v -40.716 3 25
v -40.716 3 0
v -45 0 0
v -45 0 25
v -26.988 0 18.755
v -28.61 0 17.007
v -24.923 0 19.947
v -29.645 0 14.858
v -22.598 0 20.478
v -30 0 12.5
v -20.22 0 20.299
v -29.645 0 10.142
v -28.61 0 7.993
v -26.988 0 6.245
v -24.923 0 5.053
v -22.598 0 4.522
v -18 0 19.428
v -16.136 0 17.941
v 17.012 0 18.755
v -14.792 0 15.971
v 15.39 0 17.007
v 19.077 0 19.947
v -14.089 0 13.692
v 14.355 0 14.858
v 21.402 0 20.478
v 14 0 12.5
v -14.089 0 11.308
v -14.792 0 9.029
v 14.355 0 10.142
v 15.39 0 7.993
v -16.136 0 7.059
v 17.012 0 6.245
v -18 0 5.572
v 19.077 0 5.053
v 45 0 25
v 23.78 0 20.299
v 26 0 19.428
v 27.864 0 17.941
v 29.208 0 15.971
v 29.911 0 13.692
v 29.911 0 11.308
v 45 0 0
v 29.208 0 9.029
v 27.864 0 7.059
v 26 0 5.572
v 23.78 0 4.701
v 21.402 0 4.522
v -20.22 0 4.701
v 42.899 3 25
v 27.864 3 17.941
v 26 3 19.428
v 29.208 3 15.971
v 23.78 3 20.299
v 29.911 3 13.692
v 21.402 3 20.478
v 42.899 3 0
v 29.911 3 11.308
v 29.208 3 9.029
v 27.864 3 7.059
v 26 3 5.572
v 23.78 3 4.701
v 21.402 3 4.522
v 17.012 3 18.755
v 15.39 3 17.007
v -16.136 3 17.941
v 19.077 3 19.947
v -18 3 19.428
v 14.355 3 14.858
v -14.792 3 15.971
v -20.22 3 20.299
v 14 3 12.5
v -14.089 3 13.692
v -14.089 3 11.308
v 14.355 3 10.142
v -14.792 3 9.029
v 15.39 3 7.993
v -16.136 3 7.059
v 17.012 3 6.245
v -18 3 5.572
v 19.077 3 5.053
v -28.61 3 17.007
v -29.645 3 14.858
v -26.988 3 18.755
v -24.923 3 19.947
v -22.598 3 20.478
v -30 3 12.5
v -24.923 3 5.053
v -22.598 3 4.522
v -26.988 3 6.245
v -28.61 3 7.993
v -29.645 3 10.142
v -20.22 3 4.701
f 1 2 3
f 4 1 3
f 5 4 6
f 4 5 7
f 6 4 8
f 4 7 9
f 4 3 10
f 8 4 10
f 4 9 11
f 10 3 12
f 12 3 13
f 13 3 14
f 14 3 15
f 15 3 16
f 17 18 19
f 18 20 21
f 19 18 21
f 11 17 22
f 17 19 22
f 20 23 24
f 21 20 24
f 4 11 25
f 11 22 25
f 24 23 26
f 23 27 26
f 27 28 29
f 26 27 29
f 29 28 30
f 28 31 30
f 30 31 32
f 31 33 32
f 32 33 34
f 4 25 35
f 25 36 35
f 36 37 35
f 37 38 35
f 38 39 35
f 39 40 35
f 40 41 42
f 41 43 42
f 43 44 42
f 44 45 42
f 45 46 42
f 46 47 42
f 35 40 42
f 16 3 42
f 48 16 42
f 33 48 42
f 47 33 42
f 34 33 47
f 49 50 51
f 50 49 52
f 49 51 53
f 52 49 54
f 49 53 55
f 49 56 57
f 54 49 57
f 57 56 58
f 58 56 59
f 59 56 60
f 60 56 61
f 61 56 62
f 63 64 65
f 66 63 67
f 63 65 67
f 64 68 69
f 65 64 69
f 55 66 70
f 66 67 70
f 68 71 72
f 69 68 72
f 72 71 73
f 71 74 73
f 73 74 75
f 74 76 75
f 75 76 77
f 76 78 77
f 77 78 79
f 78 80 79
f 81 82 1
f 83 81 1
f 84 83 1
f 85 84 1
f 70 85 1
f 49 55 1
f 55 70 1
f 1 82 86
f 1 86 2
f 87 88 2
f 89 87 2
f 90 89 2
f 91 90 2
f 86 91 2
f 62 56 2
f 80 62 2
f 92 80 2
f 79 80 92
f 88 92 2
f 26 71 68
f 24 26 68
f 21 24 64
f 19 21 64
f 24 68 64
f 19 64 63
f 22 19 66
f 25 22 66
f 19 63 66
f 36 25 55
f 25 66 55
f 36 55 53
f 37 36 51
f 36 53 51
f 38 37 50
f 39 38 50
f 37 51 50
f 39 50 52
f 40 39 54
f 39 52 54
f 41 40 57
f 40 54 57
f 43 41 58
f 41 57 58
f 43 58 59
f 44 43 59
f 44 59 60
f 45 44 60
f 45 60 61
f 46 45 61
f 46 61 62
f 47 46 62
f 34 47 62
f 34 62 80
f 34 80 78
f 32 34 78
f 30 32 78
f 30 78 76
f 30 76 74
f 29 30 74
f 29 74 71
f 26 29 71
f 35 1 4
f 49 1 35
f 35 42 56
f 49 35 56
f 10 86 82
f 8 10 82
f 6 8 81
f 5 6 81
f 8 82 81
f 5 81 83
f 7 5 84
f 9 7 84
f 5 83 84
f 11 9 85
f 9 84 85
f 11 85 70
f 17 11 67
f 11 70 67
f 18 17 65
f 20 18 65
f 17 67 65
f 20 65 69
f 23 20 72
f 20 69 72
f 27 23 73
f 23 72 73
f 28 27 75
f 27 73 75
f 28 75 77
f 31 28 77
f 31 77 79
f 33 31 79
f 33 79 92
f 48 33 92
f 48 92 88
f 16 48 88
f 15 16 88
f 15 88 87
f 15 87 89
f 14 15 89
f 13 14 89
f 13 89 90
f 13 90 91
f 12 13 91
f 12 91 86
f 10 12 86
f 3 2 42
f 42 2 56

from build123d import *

# Parameters (mm, degrees)
EXTRUDE_1_DEPTH     = 25
SKETCH_3_R          = 8
CUT_EXTRUDE_2_DEPTH = 52.565492337


with BuildPart() as part:
    # Эскиз2 → Бобышка-Вытянуть1 (new body)
    with BuildSketch(Plane.XY):
        Polygon((-45, 0), (45, 0), (42.899377385, 3), (-40.71555598, 3), align=None)
    extrude(amount=EXTRUDE_1_DEPTH)

    # Эскиз3 → Вырез-Вытянуть2 (cut, through all)
    with BuildSketch(Plane(origin=(0, 3, 0), x_dir=(1, 0, 0), z_dir=(0, 1, 0))):
        with Locations(Location((-22, -12.5, 0), (0, 0, 180))):
            Circle(SKETCH_3_R)
        with Locations(Location((22, -12.5, 0), (0, 0, 180))):
            Circle(SKETCH_3_R)
    extrude(amount=-CUT_EXTRUDE_2_DEPTH, mode=Mode.SUBTRACT)


solid = part.part
